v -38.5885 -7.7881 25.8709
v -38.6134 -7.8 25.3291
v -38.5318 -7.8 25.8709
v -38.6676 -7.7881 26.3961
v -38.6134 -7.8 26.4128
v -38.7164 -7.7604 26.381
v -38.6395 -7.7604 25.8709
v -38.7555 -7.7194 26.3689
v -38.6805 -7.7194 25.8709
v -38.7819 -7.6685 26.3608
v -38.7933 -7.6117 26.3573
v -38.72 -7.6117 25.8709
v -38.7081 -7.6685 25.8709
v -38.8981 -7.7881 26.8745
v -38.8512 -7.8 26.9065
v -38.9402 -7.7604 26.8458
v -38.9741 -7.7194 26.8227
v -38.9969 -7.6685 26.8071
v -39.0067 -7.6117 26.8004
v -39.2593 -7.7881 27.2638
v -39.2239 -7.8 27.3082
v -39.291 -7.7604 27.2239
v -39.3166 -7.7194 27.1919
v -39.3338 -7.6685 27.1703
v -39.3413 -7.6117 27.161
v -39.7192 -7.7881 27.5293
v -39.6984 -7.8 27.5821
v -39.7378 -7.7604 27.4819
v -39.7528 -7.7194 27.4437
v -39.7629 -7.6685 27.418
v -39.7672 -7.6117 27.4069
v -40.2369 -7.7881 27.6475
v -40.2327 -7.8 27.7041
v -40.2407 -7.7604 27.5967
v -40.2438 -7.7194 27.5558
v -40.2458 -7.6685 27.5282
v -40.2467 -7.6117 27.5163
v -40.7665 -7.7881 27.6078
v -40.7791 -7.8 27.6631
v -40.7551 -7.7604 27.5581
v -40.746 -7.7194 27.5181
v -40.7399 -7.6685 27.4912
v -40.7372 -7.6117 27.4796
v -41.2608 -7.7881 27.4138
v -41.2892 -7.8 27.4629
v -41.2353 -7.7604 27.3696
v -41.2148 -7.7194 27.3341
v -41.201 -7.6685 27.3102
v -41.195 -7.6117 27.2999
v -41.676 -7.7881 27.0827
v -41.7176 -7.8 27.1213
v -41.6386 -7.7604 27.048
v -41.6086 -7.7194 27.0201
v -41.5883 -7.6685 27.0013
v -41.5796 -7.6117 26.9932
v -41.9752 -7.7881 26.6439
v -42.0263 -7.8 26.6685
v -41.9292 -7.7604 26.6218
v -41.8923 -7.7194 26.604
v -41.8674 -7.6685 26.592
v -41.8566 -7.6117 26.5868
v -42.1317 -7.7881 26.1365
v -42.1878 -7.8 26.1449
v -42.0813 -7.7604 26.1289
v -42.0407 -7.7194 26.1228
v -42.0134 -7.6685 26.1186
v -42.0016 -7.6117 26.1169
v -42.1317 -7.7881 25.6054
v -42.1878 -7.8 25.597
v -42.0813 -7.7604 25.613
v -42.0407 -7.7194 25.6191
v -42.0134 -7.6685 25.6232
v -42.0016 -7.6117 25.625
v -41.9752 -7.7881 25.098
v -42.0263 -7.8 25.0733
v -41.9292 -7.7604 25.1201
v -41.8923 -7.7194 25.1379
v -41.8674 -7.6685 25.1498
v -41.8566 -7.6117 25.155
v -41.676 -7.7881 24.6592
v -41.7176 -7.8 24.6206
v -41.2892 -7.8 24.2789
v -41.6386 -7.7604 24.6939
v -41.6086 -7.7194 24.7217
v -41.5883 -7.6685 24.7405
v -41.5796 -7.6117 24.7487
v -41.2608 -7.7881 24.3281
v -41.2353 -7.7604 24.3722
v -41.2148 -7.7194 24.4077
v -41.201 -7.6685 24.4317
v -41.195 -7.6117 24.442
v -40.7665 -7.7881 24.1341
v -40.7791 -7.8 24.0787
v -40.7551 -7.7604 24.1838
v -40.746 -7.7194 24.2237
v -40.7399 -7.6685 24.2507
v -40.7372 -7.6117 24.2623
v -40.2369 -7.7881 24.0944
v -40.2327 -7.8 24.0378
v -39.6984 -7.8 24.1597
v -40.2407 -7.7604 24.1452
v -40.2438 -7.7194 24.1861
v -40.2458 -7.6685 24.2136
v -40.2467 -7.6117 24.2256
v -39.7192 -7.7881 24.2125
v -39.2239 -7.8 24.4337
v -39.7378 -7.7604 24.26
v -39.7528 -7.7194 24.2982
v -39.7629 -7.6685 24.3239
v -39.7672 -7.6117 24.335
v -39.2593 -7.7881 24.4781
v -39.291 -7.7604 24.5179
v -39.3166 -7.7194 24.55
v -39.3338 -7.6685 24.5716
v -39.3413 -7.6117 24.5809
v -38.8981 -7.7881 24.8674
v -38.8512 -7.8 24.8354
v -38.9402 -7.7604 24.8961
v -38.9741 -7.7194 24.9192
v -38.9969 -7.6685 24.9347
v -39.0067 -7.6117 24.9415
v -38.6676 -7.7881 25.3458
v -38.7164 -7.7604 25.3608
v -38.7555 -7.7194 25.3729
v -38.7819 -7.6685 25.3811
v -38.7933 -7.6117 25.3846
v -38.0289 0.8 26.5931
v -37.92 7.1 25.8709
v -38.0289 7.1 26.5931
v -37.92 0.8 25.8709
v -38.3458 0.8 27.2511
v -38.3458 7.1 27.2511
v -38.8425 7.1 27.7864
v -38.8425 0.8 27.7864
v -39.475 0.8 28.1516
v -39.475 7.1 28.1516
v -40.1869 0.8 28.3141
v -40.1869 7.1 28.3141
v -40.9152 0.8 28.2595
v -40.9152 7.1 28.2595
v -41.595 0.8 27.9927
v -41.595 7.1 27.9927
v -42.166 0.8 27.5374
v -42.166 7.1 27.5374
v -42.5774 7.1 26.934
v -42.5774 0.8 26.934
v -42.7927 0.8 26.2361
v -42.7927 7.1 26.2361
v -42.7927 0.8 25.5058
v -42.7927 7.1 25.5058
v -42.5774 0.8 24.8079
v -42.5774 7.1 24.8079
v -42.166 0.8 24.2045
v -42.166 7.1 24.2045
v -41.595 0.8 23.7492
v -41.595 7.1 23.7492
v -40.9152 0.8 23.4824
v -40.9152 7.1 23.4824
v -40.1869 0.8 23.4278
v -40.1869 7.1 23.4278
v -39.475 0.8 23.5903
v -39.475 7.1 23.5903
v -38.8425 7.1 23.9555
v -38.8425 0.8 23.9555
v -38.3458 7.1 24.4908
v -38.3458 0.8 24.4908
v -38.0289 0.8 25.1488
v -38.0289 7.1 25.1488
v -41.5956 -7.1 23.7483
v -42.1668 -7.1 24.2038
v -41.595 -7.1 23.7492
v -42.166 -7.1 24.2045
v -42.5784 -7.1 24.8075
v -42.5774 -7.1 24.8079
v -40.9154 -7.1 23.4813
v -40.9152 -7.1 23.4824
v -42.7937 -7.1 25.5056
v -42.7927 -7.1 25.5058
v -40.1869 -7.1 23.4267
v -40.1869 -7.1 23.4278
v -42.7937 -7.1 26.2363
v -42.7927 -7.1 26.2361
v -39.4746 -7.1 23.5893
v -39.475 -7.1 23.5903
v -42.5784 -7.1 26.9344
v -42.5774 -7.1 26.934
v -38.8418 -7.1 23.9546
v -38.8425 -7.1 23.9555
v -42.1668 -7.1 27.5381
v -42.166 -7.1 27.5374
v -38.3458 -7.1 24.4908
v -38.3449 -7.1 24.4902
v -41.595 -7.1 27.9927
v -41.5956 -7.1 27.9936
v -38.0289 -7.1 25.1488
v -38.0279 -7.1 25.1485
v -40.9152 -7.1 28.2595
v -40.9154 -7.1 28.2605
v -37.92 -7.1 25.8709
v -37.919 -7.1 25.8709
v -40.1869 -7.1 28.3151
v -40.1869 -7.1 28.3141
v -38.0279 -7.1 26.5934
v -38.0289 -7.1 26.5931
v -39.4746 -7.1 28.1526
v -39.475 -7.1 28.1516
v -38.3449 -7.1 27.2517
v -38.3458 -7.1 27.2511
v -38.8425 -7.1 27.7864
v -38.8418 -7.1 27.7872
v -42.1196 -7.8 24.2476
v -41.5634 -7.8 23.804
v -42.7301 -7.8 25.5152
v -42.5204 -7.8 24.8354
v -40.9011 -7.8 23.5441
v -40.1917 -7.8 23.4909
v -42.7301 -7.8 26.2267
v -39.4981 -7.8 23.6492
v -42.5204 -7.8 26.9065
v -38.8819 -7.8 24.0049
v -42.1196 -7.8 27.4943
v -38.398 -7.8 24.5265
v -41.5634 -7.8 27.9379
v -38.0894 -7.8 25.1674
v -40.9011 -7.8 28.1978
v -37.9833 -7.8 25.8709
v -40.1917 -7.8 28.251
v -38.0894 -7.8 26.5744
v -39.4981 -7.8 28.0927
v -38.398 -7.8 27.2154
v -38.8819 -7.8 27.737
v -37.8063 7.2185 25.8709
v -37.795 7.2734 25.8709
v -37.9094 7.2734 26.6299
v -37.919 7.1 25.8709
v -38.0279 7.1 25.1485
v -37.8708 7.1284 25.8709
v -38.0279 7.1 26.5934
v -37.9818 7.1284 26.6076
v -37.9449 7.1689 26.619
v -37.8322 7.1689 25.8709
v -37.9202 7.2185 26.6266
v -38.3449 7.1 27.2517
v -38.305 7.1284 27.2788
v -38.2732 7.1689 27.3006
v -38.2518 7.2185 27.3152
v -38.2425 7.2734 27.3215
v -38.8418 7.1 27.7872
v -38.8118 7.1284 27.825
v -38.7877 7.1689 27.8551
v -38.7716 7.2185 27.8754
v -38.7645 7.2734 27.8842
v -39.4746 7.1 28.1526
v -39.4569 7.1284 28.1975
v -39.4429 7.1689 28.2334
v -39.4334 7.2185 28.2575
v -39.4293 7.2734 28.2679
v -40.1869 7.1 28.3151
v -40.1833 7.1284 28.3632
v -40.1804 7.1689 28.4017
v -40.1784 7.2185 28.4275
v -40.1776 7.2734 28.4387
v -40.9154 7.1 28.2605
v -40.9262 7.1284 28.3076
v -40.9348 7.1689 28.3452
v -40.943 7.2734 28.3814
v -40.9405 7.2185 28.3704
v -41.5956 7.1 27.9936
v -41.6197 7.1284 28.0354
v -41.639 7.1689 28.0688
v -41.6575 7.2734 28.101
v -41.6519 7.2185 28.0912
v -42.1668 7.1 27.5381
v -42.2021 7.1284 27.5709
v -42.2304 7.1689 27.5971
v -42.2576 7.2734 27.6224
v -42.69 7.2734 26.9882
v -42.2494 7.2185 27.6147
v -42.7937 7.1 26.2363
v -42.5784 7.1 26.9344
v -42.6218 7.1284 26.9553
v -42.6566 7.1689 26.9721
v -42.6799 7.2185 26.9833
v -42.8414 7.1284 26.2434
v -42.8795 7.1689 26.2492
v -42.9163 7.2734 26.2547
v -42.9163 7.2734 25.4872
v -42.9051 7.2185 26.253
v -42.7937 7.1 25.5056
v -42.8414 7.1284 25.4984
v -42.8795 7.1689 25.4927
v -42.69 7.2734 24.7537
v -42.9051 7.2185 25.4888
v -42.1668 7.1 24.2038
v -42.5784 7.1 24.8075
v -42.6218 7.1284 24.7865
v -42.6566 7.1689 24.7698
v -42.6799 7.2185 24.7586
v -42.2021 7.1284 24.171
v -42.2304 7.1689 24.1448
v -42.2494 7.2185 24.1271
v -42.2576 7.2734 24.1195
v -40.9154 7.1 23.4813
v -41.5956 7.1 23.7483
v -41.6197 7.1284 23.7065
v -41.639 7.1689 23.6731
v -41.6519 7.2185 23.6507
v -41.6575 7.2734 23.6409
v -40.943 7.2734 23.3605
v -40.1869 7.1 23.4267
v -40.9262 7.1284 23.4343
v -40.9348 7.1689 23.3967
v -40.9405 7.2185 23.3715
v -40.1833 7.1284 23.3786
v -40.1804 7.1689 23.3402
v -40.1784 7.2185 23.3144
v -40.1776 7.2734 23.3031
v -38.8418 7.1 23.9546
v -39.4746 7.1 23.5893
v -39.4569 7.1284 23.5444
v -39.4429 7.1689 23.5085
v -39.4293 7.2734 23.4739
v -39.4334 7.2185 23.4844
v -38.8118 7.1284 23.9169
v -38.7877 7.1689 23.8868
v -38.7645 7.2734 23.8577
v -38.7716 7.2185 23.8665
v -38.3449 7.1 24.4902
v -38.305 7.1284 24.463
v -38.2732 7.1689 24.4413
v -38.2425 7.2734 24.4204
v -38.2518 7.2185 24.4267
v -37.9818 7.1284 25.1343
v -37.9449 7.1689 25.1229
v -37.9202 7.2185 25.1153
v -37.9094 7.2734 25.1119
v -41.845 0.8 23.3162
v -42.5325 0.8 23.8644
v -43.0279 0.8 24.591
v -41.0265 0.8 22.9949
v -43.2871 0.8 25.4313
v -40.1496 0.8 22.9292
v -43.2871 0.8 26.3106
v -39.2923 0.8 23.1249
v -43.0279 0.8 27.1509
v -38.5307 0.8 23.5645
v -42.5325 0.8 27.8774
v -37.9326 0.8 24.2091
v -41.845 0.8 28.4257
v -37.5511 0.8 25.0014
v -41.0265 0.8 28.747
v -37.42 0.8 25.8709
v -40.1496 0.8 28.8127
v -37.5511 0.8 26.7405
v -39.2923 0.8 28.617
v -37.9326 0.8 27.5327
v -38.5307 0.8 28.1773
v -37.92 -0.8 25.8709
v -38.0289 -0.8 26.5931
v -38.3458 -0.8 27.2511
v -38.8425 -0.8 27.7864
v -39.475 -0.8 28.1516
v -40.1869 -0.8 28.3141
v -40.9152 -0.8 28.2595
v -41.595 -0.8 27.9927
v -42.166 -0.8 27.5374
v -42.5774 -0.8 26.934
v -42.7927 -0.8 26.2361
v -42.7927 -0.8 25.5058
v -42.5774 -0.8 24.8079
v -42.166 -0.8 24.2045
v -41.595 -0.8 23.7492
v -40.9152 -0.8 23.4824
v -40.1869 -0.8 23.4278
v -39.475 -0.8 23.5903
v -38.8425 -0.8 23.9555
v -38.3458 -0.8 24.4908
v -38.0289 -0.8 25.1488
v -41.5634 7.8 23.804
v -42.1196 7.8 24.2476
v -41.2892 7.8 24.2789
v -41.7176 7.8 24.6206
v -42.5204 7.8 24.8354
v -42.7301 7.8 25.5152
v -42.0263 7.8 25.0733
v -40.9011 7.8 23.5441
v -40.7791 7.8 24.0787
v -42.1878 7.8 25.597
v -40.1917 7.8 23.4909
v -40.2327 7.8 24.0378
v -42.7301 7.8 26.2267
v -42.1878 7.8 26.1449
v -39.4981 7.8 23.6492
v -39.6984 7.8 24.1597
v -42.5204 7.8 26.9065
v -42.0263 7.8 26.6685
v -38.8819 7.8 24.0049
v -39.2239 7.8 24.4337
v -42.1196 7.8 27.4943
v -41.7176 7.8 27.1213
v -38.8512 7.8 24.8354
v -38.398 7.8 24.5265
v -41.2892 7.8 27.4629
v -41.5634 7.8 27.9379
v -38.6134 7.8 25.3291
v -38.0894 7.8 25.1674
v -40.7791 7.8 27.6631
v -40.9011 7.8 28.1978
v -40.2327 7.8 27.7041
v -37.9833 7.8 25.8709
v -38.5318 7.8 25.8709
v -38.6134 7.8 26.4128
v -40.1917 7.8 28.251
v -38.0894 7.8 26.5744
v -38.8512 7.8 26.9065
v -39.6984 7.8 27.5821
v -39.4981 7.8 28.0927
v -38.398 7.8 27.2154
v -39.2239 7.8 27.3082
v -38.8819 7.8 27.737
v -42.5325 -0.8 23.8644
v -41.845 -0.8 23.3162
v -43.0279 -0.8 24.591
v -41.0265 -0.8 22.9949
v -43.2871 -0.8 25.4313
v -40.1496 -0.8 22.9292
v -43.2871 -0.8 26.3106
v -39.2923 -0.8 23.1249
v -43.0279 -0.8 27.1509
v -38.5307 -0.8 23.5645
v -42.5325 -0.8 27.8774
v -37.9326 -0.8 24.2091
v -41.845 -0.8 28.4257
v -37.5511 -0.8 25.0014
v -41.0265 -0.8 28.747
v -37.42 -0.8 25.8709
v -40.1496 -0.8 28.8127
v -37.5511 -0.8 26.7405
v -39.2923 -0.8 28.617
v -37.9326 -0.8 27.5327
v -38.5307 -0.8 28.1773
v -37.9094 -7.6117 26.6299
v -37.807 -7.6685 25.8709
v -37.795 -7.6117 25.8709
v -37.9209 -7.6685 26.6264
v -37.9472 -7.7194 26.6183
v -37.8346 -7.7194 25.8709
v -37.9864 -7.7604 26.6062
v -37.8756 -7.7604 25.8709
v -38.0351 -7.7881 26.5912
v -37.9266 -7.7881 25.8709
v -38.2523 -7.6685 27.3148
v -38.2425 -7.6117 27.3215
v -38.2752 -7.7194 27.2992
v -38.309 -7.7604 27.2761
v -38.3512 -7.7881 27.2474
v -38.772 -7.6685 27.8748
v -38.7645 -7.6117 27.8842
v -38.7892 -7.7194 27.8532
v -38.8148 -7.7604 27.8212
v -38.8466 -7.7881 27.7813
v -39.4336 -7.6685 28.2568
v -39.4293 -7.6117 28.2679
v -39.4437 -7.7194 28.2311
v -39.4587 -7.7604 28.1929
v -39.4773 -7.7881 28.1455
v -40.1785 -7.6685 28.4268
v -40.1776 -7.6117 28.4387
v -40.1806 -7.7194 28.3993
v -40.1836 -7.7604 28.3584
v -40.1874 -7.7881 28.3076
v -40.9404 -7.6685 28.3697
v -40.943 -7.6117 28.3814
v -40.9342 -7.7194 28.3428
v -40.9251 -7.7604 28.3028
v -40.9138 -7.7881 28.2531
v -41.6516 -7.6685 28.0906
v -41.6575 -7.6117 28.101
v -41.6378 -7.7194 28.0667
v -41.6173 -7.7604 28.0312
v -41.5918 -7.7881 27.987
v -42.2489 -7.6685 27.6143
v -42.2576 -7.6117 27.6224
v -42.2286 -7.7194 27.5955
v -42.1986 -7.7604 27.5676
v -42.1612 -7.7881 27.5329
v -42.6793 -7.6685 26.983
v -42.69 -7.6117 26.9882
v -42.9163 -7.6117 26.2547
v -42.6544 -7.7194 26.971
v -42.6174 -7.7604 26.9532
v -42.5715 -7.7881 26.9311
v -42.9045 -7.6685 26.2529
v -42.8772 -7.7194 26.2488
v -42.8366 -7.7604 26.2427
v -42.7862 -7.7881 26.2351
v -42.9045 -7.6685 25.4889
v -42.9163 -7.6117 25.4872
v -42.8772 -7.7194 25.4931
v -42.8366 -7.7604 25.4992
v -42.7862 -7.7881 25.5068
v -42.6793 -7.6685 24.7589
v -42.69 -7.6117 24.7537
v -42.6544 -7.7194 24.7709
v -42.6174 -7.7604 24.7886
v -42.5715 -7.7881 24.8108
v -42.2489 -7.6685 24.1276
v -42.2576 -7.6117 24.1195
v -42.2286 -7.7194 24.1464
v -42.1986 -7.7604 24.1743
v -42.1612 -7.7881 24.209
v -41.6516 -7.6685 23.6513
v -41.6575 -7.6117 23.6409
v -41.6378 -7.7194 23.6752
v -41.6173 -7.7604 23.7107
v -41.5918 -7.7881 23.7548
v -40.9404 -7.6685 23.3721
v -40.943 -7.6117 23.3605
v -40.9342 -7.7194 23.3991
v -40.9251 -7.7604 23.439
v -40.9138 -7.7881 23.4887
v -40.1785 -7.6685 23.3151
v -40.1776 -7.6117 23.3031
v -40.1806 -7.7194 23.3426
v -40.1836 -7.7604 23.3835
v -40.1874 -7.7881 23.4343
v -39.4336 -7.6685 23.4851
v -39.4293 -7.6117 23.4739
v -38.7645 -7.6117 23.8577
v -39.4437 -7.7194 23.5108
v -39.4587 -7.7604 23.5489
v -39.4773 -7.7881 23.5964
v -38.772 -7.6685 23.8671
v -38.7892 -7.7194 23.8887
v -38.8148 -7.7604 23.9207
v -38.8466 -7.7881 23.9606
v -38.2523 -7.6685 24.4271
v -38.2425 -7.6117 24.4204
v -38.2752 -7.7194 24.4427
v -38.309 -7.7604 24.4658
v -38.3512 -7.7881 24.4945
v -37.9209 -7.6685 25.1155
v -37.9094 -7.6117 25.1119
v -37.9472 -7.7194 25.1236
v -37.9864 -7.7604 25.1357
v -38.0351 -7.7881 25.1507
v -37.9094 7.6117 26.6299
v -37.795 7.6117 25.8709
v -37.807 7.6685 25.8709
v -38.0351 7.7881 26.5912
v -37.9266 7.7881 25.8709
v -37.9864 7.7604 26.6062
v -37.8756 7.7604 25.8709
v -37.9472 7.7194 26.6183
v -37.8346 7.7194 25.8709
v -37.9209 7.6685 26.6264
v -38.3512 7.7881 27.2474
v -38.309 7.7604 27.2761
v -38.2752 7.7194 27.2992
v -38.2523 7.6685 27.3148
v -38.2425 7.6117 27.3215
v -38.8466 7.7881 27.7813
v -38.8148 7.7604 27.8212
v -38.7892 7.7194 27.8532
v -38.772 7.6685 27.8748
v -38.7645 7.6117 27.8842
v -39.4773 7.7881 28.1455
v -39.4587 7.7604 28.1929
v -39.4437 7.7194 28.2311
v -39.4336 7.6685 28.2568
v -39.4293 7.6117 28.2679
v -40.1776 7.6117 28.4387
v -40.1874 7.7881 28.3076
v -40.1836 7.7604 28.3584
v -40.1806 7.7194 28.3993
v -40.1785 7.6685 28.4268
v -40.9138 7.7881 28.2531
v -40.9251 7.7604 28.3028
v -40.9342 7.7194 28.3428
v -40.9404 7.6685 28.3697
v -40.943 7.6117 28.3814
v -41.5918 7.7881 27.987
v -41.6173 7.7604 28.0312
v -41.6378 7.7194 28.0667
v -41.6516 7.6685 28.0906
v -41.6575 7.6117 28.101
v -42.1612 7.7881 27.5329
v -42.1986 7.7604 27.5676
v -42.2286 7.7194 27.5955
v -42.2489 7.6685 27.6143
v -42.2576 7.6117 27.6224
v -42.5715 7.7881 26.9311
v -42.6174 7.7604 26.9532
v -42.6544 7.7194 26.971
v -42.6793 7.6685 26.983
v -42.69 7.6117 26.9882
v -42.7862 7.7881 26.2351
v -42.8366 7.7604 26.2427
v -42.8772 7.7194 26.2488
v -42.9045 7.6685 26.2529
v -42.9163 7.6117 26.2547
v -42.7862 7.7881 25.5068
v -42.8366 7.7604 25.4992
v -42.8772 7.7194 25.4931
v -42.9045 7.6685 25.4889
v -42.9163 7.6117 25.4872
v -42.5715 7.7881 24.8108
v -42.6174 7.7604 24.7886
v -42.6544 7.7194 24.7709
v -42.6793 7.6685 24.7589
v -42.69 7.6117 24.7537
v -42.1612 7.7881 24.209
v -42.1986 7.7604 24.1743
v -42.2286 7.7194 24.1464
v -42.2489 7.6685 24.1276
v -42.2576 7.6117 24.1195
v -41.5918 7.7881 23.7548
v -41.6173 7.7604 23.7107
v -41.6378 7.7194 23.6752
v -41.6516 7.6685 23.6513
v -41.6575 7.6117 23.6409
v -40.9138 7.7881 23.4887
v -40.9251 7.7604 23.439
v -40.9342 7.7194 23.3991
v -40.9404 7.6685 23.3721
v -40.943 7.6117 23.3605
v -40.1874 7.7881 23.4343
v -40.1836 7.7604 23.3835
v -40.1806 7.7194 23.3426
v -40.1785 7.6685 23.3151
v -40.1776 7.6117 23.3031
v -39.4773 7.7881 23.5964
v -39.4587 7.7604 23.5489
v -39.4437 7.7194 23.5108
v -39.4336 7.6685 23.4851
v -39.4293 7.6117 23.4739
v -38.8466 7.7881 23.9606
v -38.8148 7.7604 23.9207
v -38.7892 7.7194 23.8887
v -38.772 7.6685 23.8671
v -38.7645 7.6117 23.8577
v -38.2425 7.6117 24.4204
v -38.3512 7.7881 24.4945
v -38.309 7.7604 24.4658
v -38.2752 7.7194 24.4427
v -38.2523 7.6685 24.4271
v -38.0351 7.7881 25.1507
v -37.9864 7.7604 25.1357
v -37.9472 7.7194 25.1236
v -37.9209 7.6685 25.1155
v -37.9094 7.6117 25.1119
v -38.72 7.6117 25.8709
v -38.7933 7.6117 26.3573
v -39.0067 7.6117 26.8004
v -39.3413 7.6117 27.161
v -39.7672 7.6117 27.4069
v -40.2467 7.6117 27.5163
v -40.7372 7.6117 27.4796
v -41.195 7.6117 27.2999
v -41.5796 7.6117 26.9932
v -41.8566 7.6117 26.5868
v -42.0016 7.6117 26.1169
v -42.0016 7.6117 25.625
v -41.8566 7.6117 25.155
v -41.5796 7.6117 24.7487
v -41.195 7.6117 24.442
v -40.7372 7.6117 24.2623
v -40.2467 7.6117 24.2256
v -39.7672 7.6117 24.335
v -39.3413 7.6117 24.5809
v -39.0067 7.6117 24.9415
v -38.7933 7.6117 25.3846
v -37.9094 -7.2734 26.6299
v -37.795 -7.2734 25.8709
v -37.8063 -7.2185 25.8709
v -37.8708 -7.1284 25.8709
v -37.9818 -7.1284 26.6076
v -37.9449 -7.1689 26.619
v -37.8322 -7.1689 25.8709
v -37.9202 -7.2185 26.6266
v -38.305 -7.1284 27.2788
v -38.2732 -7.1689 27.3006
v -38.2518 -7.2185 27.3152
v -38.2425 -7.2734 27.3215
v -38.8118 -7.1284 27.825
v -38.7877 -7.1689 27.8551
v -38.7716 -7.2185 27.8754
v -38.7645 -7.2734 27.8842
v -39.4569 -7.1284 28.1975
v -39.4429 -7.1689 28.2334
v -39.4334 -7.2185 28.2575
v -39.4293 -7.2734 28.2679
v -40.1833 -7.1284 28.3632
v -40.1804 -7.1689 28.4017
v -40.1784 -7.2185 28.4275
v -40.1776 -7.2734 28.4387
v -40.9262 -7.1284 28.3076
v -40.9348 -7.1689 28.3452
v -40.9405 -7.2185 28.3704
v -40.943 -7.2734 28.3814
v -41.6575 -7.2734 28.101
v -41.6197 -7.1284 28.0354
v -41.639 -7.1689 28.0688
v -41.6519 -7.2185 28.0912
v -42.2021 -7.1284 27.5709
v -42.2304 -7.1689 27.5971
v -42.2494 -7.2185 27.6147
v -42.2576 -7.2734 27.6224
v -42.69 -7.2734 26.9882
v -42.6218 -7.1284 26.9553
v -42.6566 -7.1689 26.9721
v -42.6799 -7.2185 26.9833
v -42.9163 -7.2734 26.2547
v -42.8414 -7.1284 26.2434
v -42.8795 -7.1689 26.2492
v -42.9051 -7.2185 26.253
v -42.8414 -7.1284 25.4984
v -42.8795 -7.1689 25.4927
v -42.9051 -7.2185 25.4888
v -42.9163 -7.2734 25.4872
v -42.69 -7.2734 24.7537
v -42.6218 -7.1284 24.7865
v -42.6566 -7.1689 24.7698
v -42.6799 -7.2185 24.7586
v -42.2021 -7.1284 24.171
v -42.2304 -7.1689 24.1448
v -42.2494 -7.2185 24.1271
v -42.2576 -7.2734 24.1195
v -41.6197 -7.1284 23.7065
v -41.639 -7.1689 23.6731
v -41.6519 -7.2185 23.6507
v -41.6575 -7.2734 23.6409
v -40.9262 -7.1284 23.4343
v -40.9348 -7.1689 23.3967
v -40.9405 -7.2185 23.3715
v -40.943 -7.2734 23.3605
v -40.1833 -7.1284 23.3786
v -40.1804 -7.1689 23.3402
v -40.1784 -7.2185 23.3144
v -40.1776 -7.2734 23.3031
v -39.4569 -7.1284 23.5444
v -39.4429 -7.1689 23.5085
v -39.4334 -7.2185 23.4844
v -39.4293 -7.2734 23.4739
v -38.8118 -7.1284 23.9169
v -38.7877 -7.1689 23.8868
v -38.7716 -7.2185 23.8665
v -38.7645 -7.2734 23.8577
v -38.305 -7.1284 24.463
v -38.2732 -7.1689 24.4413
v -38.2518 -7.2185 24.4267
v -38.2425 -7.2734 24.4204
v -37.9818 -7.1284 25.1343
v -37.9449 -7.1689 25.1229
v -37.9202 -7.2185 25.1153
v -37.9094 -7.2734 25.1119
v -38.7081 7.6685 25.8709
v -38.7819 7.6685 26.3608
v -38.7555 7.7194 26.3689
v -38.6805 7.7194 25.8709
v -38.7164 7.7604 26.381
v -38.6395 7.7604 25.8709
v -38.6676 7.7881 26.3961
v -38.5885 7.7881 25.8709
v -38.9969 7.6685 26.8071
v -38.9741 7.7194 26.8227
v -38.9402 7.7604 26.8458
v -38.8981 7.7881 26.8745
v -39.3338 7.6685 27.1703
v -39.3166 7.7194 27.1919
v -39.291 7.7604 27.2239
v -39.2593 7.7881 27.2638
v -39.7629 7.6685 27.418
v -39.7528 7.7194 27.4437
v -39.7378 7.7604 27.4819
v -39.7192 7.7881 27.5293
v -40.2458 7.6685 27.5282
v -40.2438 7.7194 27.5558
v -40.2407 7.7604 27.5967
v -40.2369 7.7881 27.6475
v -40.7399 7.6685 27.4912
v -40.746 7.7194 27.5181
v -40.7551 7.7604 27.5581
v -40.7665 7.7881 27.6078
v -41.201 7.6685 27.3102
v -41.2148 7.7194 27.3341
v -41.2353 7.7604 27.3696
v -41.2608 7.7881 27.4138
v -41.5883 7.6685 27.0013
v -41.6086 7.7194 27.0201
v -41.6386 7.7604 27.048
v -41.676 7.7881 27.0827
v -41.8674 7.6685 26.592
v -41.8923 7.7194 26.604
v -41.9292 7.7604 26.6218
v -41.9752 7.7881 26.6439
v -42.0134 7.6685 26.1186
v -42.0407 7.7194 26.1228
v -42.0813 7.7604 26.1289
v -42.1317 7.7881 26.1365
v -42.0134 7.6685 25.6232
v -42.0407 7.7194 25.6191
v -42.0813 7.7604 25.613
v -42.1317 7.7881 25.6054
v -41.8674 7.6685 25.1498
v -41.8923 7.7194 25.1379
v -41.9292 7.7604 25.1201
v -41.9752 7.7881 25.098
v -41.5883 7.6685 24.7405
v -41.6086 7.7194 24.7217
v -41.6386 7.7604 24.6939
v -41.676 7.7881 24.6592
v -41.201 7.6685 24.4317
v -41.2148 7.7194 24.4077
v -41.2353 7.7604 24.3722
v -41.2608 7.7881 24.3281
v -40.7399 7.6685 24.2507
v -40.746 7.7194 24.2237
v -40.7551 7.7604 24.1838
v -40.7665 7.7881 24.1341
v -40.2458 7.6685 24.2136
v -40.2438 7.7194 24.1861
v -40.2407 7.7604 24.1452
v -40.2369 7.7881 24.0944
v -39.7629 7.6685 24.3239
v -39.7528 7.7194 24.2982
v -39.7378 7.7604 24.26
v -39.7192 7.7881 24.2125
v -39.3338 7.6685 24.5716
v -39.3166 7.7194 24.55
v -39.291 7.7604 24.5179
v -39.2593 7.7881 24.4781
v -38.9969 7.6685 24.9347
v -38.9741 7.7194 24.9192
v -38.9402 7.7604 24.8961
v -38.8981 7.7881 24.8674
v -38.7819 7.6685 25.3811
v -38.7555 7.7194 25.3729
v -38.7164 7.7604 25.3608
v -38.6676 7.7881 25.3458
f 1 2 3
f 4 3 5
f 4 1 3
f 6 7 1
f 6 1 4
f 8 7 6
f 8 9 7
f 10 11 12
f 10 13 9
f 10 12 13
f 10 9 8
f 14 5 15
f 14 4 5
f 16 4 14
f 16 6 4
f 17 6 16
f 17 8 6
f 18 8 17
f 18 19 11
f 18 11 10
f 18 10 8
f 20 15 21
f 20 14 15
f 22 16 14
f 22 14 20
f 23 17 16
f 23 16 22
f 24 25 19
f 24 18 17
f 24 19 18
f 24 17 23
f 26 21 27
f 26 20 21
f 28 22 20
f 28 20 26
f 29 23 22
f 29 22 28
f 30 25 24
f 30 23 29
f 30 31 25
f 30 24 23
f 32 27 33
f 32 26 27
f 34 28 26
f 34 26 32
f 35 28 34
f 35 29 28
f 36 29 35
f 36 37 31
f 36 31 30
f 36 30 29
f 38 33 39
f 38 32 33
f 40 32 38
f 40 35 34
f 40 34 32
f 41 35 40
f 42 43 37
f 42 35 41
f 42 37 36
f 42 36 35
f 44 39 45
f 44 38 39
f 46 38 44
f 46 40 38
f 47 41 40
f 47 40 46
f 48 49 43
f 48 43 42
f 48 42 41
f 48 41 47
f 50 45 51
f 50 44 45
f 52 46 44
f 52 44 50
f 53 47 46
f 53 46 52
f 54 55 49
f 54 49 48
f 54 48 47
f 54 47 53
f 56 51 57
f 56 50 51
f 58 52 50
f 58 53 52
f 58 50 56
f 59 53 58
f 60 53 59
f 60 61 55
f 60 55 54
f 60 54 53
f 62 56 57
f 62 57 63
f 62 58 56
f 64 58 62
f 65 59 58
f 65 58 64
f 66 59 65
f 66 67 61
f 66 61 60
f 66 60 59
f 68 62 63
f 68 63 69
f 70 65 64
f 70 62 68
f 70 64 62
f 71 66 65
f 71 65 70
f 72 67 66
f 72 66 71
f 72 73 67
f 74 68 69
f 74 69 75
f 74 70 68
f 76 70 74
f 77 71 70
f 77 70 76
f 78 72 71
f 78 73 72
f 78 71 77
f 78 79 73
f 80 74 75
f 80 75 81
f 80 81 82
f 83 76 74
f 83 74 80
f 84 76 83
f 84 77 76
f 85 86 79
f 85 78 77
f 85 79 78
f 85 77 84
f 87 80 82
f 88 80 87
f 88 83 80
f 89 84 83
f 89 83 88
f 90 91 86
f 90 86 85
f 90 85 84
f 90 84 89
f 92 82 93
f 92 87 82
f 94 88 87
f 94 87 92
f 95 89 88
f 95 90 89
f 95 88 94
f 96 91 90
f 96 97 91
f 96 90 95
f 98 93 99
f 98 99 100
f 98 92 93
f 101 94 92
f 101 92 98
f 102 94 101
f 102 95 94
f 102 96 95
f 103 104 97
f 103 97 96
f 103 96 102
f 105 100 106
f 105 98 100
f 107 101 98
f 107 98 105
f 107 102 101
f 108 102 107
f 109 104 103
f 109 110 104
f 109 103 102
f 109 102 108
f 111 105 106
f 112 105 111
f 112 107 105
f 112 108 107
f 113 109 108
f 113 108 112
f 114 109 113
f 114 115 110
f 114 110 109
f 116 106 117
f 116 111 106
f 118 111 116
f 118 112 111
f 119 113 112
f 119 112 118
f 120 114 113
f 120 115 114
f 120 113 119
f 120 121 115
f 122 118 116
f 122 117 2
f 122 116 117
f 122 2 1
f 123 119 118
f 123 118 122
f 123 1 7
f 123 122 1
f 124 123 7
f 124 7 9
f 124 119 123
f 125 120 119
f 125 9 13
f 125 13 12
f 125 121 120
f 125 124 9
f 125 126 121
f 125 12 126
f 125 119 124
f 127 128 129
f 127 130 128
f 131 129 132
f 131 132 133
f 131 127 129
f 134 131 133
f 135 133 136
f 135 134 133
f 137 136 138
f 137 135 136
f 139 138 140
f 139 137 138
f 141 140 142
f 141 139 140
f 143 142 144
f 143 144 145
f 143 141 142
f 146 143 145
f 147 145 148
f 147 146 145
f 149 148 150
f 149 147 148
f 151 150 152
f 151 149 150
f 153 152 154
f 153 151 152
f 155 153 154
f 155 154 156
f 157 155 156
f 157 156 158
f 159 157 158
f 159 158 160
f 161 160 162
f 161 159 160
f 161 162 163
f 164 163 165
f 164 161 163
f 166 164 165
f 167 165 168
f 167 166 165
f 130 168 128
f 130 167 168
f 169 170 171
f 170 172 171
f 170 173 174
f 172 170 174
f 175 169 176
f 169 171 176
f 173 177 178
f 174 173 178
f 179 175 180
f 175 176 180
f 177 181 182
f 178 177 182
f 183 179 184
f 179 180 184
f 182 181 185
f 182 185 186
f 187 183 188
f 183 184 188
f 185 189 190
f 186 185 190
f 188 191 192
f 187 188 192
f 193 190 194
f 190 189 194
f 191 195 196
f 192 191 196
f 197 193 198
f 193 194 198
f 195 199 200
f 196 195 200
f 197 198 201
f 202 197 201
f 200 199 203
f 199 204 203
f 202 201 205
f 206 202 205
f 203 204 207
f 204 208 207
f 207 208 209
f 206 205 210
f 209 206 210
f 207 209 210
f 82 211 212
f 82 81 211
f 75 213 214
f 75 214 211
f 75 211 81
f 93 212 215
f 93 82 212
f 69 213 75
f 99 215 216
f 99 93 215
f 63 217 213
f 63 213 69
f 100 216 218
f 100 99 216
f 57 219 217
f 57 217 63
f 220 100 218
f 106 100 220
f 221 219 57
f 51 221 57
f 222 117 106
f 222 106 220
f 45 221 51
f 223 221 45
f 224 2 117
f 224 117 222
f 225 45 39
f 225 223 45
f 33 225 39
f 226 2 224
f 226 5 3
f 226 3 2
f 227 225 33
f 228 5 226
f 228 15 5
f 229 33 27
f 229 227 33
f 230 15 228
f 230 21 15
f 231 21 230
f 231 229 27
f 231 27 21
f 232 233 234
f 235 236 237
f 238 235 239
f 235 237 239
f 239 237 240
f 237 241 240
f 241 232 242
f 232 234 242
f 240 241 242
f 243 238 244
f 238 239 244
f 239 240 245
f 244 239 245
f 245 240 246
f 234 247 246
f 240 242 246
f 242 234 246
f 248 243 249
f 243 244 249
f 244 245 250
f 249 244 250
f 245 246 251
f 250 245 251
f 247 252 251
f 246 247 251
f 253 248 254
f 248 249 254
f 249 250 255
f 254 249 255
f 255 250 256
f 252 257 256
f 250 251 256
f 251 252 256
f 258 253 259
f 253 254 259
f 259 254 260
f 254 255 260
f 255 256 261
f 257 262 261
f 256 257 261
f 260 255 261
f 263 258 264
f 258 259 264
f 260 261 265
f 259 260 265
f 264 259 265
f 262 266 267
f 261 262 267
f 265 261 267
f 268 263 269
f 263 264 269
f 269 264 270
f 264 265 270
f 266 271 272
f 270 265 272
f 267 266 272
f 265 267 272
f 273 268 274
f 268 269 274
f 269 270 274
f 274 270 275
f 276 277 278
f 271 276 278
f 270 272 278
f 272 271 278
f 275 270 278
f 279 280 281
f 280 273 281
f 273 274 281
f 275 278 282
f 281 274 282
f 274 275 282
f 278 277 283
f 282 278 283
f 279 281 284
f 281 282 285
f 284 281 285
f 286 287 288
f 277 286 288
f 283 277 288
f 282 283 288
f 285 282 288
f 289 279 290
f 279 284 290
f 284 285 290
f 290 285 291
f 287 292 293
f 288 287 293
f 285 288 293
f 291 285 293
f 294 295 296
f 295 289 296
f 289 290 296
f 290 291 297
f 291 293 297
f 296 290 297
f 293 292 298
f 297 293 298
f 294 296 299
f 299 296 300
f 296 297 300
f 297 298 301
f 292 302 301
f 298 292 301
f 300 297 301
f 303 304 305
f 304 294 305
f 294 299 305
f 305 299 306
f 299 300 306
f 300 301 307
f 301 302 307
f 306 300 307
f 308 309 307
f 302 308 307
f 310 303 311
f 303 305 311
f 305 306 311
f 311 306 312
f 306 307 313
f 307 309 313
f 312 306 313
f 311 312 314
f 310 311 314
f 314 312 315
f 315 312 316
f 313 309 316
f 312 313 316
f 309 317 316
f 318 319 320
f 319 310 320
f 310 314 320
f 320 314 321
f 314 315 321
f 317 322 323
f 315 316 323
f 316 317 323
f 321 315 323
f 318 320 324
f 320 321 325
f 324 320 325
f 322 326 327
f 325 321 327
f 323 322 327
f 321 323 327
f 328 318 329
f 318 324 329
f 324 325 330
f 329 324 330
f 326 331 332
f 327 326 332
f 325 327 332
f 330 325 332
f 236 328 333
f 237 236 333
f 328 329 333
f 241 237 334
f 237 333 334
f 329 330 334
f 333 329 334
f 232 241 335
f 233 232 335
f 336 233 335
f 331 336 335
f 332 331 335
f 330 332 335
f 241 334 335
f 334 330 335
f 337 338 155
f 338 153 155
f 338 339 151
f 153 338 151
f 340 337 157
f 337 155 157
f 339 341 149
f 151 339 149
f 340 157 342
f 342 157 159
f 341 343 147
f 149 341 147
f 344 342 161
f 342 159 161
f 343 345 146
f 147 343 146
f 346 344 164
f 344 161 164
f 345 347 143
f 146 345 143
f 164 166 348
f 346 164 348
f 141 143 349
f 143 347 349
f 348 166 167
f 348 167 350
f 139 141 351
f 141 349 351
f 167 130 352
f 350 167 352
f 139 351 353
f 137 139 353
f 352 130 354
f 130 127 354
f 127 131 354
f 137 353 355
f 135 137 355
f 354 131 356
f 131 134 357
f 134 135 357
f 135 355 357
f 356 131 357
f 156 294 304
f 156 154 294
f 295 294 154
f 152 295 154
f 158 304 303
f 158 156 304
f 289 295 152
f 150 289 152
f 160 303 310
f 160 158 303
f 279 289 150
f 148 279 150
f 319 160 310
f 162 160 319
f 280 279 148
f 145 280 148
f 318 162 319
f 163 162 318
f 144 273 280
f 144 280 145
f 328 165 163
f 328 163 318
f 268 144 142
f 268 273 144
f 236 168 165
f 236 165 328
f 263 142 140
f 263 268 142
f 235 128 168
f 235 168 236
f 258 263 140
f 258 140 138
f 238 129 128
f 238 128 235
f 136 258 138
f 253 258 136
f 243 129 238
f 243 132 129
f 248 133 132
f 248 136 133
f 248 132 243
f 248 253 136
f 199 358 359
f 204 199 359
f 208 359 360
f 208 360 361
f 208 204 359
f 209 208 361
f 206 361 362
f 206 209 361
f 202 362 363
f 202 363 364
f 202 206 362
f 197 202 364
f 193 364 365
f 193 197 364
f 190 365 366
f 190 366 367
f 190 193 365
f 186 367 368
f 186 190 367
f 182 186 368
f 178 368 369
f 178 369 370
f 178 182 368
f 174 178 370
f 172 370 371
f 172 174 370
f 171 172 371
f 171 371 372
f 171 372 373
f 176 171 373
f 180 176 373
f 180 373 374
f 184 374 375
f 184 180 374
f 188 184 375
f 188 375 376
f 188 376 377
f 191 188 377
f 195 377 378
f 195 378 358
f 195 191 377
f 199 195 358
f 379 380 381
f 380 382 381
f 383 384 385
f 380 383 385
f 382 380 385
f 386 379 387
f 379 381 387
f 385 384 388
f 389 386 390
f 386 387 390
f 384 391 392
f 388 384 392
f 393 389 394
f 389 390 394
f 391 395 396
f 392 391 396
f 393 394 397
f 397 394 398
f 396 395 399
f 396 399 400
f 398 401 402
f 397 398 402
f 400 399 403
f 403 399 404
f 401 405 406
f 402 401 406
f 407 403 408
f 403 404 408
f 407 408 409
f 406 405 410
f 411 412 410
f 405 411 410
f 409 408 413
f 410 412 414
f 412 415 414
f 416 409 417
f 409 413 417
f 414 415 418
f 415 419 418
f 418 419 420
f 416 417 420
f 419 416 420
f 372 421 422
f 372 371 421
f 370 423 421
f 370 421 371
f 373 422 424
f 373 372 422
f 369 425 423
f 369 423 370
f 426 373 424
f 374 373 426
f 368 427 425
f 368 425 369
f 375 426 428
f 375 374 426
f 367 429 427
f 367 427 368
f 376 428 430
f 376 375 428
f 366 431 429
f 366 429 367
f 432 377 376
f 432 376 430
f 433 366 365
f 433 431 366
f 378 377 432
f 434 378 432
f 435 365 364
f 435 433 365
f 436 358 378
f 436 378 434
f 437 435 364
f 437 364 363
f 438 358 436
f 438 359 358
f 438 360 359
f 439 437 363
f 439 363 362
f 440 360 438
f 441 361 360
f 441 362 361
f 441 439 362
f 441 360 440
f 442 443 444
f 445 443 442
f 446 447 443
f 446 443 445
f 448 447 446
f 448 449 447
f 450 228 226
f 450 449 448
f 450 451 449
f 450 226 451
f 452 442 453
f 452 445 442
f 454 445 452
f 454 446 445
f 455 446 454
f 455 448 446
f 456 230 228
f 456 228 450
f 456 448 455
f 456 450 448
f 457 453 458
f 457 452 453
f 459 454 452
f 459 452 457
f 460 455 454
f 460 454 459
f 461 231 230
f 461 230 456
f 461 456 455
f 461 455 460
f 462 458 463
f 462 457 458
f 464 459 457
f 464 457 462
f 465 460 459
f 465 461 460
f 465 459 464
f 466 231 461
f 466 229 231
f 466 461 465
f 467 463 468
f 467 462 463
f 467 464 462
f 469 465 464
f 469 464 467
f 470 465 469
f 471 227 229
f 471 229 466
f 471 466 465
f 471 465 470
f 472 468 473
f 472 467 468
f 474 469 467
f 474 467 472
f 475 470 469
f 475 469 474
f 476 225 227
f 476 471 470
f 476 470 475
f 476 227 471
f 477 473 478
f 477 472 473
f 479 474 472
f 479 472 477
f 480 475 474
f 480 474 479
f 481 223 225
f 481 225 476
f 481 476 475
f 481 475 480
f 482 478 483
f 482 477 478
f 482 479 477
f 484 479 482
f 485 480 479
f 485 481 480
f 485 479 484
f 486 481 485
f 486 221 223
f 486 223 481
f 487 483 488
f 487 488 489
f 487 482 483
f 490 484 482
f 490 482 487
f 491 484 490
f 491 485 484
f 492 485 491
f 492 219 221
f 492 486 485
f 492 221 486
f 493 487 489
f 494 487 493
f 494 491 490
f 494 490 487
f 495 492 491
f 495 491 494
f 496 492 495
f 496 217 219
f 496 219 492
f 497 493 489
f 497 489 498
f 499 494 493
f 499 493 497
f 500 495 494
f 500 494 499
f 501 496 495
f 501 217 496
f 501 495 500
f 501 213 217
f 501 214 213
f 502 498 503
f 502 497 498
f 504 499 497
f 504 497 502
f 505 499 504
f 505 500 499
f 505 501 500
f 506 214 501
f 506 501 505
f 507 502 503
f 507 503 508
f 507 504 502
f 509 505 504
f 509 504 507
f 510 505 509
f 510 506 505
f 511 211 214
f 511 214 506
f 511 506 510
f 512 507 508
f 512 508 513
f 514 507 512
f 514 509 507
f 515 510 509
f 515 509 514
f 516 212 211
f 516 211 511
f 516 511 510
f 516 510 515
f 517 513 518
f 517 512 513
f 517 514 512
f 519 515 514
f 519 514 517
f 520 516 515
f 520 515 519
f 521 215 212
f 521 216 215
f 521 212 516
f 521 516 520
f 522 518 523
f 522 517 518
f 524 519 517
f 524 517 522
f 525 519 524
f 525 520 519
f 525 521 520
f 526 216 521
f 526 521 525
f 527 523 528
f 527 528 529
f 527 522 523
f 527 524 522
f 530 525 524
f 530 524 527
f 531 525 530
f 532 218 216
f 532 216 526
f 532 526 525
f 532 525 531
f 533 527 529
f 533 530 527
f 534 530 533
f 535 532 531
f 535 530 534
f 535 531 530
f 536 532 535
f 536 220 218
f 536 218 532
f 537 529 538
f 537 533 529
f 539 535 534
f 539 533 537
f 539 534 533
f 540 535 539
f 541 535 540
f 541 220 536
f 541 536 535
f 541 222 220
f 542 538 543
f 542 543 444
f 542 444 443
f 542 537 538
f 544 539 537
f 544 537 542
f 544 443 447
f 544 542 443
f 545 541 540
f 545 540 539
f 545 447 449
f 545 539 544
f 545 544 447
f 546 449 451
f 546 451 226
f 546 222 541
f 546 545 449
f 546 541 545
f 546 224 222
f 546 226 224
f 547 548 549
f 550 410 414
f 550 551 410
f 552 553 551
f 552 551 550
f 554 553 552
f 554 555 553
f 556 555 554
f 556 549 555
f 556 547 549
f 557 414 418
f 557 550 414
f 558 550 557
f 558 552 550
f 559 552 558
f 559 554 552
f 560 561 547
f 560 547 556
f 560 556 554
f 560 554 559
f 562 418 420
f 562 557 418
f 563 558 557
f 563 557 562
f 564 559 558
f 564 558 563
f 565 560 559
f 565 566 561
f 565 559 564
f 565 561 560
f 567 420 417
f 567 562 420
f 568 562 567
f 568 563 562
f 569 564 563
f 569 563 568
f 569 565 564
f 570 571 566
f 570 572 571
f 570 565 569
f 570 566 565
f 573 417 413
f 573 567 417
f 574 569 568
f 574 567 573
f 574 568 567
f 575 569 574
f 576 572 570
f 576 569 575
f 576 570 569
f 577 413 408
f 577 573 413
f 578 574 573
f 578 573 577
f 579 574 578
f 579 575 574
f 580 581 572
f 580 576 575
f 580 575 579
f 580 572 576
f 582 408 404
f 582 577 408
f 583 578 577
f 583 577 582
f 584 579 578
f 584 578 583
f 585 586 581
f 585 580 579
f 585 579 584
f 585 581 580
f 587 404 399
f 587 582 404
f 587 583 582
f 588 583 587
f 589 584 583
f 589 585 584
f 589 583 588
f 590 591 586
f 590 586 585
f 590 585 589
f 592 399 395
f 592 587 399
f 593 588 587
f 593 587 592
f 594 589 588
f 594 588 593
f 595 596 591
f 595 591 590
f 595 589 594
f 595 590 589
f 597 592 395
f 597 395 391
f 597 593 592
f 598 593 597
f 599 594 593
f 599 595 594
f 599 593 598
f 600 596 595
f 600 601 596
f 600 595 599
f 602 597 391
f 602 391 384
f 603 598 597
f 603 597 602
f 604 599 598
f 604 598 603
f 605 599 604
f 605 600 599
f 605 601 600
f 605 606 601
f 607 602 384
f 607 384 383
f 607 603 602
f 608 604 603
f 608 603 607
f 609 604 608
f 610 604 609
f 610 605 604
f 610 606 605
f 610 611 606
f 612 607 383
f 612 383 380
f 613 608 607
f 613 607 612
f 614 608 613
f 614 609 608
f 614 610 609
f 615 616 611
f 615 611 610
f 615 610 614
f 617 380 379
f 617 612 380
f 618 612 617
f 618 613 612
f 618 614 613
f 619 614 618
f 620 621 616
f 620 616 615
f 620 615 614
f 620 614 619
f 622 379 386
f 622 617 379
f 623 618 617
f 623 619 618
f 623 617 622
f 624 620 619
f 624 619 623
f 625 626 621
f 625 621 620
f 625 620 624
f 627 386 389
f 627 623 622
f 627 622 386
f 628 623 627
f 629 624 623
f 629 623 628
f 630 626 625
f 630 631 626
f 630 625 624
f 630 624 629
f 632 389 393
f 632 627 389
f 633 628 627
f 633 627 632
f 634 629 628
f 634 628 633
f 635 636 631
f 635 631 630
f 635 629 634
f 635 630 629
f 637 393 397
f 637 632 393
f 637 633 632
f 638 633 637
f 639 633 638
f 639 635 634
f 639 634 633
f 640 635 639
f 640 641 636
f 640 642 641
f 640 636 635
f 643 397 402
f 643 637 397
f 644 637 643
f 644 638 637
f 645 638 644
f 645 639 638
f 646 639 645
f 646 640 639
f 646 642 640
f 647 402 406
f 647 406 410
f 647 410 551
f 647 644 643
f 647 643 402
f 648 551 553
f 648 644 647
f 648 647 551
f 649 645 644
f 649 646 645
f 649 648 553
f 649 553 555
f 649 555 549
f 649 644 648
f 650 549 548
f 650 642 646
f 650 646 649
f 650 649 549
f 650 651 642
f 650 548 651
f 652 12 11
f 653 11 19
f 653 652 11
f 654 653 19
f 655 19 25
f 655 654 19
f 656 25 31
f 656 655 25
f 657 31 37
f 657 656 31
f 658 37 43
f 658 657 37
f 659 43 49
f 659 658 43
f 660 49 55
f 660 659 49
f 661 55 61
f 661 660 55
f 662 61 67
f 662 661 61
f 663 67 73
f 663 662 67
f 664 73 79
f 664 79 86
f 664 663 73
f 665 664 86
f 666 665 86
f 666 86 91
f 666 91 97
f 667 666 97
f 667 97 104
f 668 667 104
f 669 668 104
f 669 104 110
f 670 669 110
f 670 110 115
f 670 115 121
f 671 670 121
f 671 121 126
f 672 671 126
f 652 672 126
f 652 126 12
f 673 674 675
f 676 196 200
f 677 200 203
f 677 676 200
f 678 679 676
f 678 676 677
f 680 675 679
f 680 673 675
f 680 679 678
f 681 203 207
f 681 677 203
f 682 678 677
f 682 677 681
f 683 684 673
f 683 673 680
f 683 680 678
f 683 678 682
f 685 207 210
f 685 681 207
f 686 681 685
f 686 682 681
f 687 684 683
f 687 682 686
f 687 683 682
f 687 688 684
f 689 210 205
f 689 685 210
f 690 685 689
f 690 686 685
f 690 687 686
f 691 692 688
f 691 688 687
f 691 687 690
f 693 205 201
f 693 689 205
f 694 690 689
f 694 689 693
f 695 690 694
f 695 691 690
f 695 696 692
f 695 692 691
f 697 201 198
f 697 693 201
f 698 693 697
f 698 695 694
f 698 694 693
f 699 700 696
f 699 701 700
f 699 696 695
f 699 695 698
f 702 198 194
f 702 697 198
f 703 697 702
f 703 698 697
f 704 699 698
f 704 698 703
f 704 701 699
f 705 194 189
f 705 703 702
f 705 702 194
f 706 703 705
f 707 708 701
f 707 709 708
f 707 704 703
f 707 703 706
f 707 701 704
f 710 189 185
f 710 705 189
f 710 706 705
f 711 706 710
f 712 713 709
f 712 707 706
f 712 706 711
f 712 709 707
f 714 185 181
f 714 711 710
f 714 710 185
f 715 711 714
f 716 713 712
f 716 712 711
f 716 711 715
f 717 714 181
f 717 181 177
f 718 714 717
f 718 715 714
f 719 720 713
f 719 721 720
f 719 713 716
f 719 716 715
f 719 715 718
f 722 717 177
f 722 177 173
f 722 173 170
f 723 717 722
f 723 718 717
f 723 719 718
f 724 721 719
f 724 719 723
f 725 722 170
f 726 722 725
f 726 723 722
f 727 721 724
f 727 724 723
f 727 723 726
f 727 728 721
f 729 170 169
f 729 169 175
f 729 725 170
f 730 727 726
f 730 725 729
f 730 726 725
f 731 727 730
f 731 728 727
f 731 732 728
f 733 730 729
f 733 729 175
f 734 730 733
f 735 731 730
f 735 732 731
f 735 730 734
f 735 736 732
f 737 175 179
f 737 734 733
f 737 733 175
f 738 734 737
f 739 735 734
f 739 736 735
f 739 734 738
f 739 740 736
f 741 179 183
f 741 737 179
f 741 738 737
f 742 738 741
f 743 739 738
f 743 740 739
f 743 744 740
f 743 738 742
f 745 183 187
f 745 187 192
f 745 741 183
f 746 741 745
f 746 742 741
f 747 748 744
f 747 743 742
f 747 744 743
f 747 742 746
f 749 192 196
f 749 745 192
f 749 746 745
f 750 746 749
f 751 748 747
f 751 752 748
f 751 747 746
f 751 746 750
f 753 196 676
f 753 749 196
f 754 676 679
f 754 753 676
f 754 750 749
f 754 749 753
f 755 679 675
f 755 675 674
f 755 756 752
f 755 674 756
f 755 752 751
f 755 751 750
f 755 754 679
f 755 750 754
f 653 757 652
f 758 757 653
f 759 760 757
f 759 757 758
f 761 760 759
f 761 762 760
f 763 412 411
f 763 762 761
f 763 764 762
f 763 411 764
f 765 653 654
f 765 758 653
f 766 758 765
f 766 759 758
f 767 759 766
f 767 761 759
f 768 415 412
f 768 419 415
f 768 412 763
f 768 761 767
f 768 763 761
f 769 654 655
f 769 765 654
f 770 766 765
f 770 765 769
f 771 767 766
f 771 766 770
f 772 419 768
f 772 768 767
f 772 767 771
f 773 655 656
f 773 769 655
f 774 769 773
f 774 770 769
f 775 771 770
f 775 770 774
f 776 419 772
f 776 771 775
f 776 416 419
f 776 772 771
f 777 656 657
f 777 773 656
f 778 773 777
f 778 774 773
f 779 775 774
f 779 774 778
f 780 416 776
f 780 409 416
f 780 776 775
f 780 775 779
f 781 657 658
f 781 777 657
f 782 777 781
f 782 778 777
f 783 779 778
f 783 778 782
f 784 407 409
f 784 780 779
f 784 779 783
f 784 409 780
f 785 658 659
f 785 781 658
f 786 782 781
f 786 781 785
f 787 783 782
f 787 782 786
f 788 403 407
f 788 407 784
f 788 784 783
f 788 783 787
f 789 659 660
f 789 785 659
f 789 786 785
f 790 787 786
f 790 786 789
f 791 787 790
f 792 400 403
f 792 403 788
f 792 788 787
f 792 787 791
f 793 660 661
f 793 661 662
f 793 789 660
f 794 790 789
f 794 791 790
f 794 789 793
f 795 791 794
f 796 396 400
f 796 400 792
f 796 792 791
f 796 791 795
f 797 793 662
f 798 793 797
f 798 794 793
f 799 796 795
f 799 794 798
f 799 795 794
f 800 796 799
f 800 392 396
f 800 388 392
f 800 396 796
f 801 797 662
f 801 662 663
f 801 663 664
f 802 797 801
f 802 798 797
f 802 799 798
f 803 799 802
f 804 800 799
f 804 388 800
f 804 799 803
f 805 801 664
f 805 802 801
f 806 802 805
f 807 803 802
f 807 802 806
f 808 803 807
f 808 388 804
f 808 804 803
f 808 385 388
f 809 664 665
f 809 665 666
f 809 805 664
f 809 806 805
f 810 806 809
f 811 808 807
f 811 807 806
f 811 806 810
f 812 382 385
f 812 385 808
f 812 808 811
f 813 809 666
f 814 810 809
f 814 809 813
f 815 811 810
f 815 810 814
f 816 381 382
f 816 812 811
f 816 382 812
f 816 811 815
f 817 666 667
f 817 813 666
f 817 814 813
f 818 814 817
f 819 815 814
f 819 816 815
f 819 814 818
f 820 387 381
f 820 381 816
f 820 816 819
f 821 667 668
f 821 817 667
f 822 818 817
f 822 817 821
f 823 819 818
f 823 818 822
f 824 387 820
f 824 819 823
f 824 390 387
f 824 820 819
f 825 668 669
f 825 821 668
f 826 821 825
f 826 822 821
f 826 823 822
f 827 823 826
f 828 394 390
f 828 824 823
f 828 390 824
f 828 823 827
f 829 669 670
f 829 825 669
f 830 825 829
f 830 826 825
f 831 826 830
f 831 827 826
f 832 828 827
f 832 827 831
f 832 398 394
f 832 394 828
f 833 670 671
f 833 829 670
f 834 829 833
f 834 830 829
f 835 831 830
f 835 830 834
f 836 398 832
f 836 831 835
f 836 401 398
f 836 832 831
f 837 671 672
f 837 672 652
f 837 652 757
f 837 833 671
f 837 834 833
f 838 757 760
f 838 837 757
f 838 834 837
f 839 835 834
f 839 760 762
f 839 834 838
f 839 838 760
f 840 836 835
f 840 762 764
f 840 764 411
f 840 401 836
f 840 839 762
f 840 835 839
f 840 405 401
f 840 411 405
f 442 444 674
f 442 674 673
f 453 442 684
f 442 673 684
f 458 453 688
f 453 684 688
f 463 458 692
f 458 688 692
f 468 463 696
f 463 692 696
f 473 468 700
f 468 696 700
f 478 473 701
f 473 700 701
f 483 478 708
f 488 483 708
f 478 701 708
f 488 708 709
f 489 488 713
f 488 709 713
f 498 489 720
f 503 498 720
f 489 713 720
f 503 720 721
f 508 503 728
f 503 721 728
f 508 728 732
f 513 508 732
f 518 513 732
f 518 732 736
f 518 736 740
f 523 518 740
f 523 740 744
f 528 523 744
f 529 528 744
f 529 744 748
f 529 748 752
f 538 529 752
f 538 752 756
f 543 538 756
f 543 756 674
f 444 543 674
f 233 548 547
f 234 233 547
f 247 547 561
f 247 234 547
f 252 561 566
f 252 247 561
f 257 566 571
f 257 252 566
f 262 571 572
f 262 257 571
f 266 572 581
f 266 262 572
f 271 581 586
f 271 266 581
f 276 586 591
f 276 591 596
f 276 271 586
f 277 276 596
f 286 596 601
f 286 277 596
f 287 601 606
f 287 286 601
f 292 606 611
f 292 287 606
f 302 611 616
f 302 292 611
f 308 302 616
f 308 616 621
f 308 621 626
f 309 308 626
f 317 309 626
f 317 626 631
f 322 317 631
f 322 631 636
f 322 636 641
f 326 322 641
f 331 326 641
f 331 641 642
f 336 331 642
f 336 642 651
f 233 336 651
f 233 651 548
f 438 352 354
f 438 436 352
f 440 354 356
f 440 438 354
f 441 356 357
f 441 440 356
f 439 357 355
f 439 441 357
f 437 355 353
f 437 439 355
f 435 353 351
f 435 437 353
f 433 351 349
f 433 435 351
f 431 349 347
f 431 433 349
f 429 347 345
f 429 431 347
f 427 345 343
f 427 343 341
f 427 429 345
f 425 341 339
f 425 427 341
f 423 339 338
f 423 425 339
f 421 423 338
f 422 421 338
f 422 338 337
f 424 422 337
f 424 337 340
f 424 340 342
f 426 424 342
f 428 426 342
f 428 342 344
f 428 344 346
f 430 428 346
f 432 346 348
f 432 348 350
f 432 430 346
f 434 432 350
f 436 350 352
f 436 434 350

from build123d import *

# Parameters (mm, degrees)
F0_R     = 2.95
F0_R_2   = 2.575
F1_DEPTH = 0.8
F0_R_3   = 2.45
F2_DEPTH = 0.8
F0_R_4   = 1.65
F3_DEPTH = 7.8
F4_DEPTH = 7.8
F5_DEPTH = 7.1
F6_DEPTH = 7.8
F7_DEPTH = 0.8


# Not quite as in the source:
# - a fillet or chamfer that OpenCascade refuses, or shapes differently, is made with other operations: its cross-section is extruded or revolved along the edge and cut away or added


with BuildPart() as f1:
    # F0 (on Front) → F1 (new body)
    with BuildSketch(Plane.XZ):
        with Locations((-40.3700359166, 25.8709397167)):
            Circle(F0_R)
        with Locations((-40.3700359166, 25.8709397167)):
            Circle(F0_R_2, mode=Mode.SUBTRACT)
    extrude(amount=F1_DEPTH)

    # F0 (on Front) → F2 (join)
    with BuildSketch(Plane.XZ):
        with Locations((-40.3700359166, 25.8709397167)):
            Circle(F0_R_2)
        with Locations((-40.3700359166, 25.8709397167)):
            Circle(F0_R_3, mode=Mode.SUBTRACT)
    extrude(amount=F2_DEPTH)

    # F0 (on Front) → F3 (join)
    with BuildSketch(Plane.XZ):
        with Locations((-40.3700359166, 25.8709397167)):
            Circle(F0_R_3)
        with Locations((-40.3700359166, 25.8709397167)):
            Circle(F0_R_4, mode=Mode.SUBTRACT)
    extrude(amount=F3_DEPTH)

    # F0 (on Front) → F4 (join)
    with BuildSketch(Plane.XZ):
        with Locations((-40.3700359166, 25.8709397167)):
            Circle(F0_R_2)
        with Locations((-40.3700359166, 25.8709397167)):
            Circle(F0_R_3, mode=Mode.SUBTRACT)
    extrude(amount=F4_DEPTH)

    # F0 (on Front) → F5 (cut)
    with BuildSketch(Plane.XZ):
        with Locations((-40.3700359166, 25.8709397167)):
            Circle(F0_R_2)
        with Locations((-40.3700359166, 25.8709397167)):
            Circle(F0_R_3, mode=Mode.SUBTRACT)
    extrude(amount=F5_DEPTH, mode=Mode.SUBTRACT)

    # F0 (on Front) → F6 (join)
    with BuildSketch(Plane.XZ):
        with Locations((-40.3700359166, 25.8709397167)):
            Circle(F0_R_3)
        with Locations((-40.3700359166, 25.8709397167)):
            Circle(F0_R_4, mode=Mode.SUBTRACT)
    extrude(amount=-F6_DEPTH)

    # F0 (on Front) → F7 (join)
    with BuildSketch(Plane.XZ):
        with Locations((-40.3700359166, 25.8709397167)):
            Circle(F0_R)
        with Locations((-40.3700359166, 25.8709397167)):
            Circle(F0_R_2, mode=Mode.SUBTRACT)
        with Locations((-40.3700359166, 25.8709397167)):
            Circle(F0_R_2)
        with Locations((-40.3700359166, 25.8709397167)):
            Circle(F0_R_3, mode=Mode.SUBTRACT)
    extrude(amount=-F7_DEPTH)

    # F8: F1 across plane


with BuildPart() as f1_1:
    add(f1.part)
    add(f1.part.mirror(Plane.XZ))

    # F9: fillet of radius 0.2 on 6 edges, made by hand

    # F9_s1 → F9_t2 (revolve, cut)
    with BuildSketch(Plane.XY.offset(25.8709397167)):
        with BuildLine():
            ThreePointArc((-38.5190702311, -7.8004), (-38.6614572728, -7.7414213562), (-38.7204359166, -7.5990343146))
            Line((-38.7204359166, -7.5990343146), (-38.7405724851, -7.5990343146))
            ThreePointArc((-38.7405724851, -7.5990343146), (-38.7401724851, -7.6995171573), (-38.7401724851, -7.8))
            Line((-38.7401724851, -7.8), (-38.7200359166, -7.8201365685))
            ThreePointArc((-38.7200359166, -7.8201365685), (-38.6195530739, -7.8201365685), (-38.5190702311, -7.8205365685))
            Line((-38.5190702311, -7.8205365685), (-38.5190702311, -7.8004))
        make_face()
    revolve(axis=Axis((-40.3700359166, -7.8, 25.8709397167), (0, -1, 0)), mode=Mode.SUBTRACT)

    # F9_s3 → F9_t4 (revolve, cut)
    with BuildSketch(Plane.XY.offset(25.8709397167)):
        with BuildLine():
            ThreePointArc((-37.7946359166, -7.5990343146), (-37.8536145603, -7.7414213562), (-37.996001602, -7.8004))
            Line((-37.996001602, -7.8004), (-37.996001602, -7.8205365685))
            ThreePointArc((-37.996001602, -7.8205365685), (-37.8955187593, -7.8201365685), (-37.7950359166, -7.8201365685))
            Line((-37.7950359166, -7.8201365685), (-37.774899348, -7.8))
            ThreePointArc((-37.774899348, -7.8), (-37.774899348, -7.6995171573), (-37.774499348, -7.5990343146))
            Line((-37.774499348, -7.5990343146), (-37.7946359166, -7.5990343146))
        make_face()
    revolve(axis=Axis((-40.3700359166, -7.8, 25.8709397167), (0, -1, 0)), mode=Mode.SUBTRACT)

    # F9_s5 → F9_t6 (revolve, cut)
    with BuildSketch(Plane.XY.offset(25.8709397167)):
        with BuildLine():
            ThreePointArc((-37.9198847153, -7.0996296783), (-37.828855755, -7.173758828), (-37.7946359166, -7.286054888))
            Line((-37.7946359166, -7.286054888), (-37.774499348, -7.286054888))
            ThreePointArc((-37.774499348, -7.286054888), (-37.774899348, -7.193027444), (-37.774899348, -7.1))
            Line((-37.774899348, -7.1), (-37.7950359166, -7.0798634315))
            ThreePointArc((-37.7950359166, -7.0798634315), (-37.8574603159, -7.0798634315), (-37.9122730266, -7.0809871573))
            Line((-37.9122730266, -7.0809871573), (-37.9198847153, -7.0996296783))
        make_face()
    revolve(axis=Axis((-40.3700359166, -7.1, 25.8709397167), (0, -1, 0)), mode=Mode.SUBTRACT)

    # F9_s7 → F9_t8 (revolve, cut)
    with BuildSketch(Plane.XY.offset(25.8709397167)):
        with BuildLine():
            ThreePointArc((-37.996001602, 7.8004), (-37.8536145603, 7.7414213562), (-37.7946359166, 7.5990343146))
            Line((-37.7946359166, 7.5990343146), (-37.774499348, 7.5990343146))
            ThreePointArc((-37.774499348, 7.5990343146), (-37.774899348, 7.6995171573), (-37.774899348, 7.8))
            Line((-37.774899348, 7.8), (-37.7950359166, 7.8201365685))
            ThreePointArc((-37.7950359166, 7.8201365685), (-37.8955187593, 7.8201365685), (-37.996001602, 7.8205365685))
            Line((-37.996001602, 7.8205365685), (-37.996001602, 7.8004))
        make_face()
    revolve(axis=Axis((-40.3700359166, 7.8, 25.8709397167), (0, -1, 0)), mode=Mode.SUBTRACT)

    # F9_s9 → F9_t10 (revolve, cut)
    with BuildSketch(Plane.XY.offset(25.8709397167)):
        with BuildLine():
            ThreePointArc((-37.9198847153, 7.0996296783), (-37.828855755, 7.173758828), (-37.7946359166, 7.286054888))
            Line((-37.7946359166, 7.286054888), (-37.774499348, 7.286054888))
            ThreePointArc((-37.774499348, 7.286054888), (-37.774899348, 7.193027444), (-37.774899348, 7.1))
            Line((-37.774899348, 7.1), (-37.7950359166, 7.0798634315))
            ThreePointArc((-37.7950359166, 7.0798634315), (-37.8574603159, 7.0798634315), (-37.9122730266, 7.0809871573))
            Line((-37.9122730266, 7.0809871573), (-37.9198847153, 7.0996296783))
        make_face()
    revolve(axis=Axis((-40.3700359166, 7.1, 25.8709397167), (0, -1, 0)), mode=Mode.SUBTRACT)

    # F9_s11 → F9_t12 (revolve, cut)
    with BuildSketch(Plane.XY.offset(25.8709397167)):
        with BuildLine():
            ThreePointArc((-38.7204359166, 7.5990343146), (-38.6614572728, 7.7414213562), (-38.5190702311, 7.8004))
            Line((-38.5190702311, 7.8004), (-38.5190702311, 7.8205365685))
            ThreePointArc((-38.5190702311, 7.8205365685), (-38.6195530739, 7.8201365685), (-38.7200359166, 7.8201365685))
            Line((-38.7200359166, 7.8201365685), (-38.7401724851, 7.8))
            ThreePointArc((-38.7401724851, 7.8), (-38.7401724851, 7.6995171573), (-38.7405724851, 7.5990343146))
            Line((-38.7405724851, 7.5990343146), (-38.7204359166, 7.5990343146))
        make_face()
    revolve(axis=Axis((-40.3700359166, 7.8, 25.8709397167), (0, -1, 0)), mode=Mode.SUBTRACT)


solid = f1_1.part
